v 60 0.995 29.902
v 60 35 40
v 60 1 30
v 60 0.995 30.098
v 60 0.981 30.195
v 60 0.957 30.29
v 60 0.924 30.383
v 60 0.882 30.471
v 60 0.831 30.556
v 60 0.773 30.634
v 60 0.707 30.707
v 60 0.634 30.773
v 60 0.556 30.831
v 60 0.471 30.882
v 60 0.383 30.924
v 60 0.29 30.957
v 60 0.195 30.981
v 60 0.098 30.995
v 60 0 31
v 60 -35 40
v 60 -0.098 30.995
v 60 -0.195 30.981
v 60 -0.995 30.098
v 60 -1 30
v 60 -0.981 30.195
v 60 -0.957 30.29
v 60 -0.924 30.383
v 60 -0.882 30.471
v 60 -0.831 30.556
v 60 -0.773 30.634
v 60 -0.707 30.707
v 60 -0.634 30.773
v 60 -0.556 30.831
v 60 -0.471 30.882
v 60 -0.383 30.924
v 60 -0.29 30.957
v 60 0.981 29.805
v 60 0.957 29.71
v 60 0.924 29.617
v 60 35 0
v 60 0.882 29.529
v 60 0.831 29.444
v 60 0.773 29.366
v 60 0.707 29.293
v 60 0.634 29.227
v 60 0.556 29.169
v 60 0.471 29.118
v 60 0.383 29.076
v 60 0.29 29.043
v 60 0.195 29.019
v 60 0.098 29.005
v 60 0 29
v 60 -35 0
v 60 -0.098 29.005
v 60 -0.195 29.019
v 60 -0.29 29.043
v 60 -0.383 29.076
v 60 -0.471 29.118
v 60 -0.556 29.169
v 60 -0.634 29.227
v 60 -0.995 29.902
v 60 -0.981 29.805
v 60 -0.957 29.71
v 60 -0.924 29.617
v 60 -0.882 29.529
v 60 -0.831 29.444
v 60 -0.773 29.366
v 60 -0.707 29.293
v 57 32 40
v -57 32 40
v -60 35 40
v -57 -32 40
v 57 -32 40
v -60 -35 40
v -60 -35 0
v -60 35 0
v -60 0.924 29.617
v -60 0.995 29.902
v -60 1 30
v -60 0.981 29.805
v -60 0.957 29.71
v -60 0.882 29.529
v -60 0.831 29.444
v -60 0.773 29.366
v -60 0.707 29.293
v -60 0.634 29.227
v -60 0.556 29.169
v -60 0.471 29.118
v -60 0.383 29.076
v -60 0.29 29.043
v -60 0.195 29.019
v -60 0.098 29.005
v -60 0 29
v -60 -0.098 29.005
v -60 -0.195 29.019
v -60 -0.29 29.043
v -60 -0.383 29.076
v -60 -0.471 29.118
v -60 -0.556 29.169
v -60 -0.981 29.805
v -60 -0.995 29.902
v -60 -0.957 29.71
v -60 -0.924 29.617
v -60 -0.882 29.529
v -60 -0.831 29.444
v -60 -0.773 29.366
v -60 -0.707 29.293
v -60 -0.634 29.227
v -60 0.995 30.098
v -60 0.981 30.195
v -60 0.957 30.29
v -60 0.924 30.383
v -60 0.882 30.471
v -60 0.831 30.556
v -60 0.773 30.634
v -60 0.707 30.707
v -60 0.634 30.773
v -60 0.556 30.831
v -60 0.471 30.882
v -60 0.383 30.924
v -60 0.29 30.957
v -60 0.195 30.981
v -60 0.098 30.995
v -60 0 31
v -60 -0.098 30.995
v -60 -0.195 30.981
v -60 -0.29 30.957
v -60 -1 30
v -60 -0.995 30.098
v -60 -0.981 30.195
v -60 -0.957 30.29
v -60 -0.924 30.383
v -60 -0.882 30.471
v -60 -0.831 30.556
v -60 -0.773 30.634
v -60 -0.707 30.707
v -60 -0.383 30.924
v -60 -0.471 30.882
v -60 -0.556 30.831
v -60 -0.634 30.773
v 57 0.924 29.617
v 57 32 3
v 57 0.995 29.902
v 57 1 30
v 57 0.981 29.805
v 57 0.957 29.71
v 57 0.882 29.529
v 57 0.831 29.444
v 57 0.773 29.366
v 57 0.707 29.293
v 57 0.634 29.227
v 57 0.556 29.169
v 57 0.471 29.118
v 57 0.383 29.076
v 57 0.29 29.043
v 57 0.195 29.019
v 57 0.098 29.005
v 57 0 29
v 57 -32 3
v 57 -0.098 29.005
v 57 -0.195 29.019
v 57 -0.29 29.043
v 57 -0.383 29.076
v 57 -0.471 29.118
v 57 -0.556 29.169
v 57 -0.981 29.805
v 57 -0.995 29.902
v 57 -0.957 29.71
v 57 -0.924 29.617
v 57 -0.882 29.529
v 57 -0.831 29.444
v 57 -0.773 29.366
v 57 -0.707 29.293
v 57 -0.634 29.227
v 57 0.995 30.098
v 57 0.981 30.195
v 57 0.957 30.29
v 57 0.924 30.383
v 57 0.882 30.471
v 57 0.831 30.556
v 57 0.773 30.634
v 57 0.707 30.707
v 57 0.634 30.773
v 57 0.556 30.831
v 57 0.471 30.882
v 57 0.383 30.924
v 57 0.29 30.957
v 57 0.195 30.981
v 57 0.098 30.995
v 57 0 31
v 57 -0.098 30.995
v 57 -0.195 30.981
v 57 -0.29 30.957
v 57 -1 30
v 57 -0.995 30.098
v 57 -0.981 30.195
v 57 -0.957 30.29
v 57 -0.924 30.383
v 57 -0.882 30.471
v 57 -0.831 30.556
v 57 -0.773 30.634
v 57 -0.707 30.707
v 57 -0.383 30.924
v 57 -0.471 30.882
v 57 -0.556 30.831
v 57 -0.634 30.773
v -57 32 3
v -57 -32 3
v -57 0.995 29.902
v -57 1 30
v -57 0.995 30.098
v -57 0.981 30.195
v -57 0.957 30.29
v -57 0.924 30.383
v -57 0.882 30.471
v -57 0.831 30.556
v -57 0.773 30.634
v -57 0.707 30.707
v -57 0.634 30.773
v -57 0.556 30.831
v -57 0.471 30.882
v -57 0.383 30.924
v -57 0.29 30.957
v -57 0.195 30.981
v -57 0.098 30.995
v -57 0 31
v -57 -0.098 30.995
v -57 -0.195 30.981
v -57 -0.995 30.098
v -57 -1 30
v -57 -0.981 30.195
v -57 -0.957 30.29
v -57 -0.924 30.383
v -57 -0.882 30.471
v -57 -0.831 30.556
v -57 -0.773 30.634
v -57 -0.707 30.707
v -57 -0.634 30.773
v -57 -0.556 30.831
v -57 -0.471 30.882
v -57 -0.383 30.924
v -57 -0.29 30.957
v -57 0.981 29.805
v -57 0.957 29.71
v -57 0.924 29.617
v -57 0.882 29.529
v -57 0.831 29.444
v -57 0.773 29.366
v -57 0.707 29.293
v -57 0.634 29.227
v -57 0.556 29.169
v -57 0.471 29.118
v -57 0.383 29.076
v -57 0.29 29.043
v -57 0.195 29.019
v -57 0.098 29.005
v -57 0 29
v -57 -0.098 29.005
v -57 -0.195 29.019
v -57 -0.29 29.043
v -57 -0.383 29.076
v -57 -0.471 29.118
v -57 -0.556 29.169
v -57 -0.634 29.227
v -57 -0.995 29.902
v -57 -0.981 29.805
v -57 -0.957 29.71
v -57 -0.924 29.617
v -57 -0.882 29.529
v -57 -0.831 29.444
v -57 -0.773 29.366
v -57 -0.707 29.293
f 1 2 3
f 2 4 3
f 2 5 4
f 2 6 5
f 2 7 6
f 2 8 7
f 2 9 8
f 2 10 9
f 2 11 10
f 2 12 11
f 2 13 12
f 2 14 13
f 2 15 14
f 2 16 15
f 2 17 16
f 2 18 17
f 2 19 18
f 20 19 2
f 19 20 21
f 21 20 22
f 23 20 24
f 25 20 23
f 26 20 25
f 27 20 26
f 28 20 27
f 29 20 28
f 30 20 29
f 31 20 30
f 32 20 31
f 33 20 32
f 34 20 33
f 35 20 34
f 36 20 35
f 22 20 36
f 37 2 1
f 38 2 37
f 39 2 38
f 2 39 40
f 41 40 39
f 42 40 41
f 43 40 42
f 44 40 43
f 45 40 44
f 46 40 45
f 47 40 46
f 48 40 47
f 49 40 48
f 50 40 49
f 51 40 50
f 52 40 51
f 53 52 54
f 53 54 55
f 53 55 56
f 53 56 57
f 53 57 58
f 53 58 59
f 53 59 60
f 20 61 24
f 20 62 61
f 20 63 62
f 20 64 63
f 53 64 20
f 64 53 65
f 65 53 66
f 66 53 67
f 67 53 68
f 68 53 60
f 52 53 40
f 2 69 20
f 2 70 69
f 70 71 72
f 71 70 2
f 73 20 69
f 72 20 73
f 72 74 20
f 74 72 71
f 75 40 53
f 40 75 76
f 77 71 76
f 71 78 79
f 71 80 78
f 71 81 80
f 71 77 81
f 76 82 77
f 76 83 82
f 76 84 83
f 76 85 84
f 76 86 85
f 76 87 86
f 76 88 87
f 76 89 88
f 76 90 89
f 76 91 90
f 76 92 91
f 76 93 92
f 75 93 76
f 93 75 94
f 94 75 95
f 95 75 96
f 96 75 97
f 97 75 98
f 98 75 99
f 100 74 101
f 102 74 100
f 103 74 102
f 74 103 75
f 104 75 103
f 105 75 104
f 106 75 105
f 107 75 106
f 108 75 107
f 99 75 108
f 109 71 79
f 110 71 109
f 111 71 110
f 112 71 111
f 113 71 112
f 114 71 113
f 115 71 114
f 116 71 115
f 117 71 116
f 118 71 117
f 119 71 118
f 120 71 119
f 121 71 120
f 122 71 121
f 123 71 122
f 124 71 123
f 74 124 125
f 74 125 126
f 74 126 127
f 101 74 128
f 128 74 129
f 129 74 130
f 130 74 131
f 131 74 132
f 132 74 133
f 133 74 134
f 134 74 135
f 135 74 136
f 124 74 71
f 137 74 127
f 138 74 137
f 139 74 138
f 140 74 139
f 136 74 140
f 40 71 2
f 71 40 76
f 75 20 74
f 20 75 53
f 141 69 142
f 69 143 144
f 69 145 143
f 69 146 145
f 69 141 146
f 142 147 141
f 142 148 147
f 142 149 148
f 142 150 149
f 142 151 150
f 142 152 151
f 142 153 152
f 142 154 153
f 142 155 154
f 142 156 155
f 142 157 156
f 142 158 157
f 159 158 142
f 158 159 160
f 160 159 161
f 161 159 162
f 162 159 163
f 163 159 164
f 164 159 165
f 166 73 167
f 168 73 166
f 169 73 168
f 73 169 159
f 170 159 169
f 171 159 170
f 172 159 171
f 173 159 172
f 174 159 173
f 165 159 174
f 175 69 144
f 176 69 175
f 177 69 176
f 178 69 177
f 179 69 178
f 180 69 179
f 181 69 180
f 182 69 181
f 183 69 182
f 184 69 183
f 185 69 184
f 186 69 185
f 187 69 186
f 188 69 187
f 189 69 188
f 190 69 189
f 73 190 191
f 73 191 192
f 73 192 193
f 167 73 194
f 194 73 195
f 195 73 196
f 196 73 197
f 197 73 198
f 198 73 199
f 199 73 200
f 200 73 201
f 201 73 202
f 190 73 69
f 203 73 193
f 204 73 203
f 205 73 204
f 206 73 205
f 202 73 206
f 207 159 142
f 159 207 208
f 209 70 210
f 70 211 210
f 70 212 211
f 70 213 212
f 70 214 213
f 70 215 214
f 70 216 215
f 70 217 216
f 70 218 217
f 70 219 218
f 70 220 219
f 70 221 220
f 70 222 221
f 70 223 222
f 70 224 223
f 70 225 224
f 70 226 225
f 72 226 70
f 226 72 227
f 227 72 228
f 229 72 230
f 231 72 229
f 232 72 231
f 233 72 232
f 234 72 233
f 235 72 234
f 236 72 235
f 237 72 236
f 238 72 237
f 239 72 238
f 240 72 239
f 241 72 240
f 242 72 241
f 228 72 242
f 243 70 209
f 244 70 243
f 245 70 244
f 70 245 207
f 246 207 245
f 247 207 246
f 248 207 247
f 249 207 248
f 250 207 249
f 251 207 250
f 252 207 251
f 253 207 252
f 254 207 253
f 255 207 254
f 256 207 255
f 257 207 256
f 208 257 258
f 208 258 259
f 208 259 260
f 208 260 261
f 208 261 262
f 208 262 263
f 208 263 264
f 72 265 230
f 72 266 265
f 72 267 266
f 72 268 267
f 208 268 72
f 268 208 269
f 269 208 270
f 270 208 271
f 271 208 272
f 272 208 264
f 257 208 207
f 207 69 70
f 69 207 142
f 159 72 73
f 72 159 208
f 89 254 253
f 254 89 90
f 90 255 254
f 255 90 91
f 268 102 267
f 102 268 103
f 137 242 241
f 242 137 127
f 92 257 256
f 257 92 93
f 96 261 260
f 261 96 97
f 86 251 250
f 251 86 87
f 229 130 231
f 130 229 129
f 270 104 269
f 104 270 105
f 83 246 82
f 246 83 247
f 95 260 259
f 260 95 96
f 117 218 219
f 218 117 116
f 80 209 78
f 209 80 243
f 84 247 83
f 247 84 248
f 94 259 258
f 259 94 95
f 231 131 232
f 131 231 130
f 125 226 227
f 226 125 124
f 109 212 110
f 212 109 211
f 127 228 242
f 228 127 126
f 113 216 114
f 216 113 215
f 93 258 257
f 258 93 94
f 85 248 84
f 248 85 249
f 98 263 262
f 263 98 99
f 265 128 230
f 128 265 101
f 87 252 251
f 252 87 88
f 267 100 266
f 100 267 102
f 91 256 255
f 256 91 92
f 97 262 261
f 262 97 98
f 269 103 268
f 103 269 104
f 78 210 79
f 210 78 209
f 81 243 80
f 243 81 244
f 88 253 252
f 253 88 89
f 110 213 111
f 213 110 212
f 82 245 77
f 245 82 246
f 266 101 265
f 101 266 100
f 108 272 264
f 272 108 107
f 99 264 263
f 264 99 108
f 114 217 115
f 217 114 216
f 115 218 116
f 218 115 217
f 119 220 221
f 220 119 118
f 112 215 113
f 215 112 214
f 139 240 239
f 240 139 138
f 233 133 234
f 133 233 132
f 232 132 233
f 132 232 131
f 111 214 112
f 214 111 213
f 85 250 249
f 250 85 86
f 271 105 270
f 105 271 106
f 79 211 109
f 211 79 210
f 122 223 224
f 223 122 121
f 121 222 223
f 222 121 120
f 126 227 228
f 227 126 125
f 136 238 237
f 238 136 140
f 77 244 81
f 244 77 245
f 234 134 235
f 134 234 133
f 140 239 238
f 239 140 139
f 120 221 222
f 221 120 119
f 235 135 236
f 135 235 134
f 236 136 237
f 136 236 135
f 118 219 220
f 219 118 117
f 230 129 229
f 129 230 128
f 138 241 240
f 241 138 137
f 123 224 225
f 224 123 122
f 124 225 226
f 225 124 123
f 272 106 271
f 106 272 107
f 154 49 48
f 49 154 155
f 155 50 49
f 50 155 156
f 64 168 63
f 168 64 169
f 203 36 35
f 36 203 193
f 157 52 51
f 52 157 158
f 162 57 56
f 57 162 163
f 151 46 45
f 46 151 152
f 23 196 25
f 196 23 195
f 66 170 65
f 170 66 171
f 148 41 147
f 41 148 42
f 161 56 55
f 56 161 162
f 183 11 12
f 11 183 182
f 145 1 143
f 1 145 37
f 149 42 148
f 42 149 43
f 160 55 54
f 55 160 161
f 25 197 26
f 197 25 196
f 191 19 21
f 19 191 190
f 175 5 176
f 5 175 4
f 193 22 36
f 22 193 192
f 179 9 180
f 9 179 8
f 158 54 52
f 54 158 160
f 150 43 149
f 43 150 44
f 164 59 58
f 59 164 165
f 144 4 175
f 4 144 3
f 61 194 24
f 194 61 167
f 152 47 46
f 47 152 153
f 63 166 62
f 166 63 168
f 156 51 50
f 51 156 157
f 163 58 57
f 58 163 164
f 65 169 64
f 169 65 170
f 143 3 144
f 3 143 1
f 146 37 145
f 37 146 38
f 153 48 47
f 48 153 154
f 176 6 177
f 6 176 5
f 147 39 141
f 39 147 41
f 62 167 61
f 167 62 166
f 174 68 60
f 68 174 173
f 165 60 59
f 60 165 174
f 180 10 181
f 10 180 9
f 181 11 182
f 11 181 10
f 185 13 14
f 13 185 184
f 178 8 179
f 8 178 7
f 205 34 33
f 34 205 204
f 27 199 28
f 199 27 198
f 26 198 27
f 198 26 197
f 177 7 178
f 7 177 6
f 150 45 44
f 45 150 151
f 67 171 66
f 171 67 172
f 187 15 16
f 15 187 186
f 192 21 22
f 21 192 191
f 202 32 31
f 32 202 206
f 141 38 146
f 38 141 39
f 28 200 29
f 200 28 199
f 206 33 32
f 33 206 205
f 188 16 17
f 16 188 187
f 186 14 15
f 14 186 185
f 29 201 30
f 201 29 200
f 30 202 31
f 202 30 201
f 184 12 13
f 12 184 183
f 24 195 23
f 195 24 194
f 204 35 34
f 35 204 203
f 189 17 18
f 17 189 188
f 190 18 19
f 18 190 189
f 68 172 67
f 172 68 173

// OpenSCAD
// Buffer tank for mini horizontal gel-electrophoresis box
// Dimensions measured with calipers

// Outer dimensions
outer_x = 120;
outer_y = 70;
outer_z = 40;

// Wall and floor thickness
wall_thickness = 3;
floor_thickness = 3;

// Inner dimensions (derived)
inner_x = outer_x - 2 * wall_thickness;
inner_y = outer_y - 2 * wall_thickness;
inner_z = outer_z - floor_thickness;

// Gel tray platform dimensions
platform_x = 60;
platform_y = inner_y; // spans full inner width
platform_z = 10; // height above inner floor
platform_top_z = floor_thickness + platform_z; // absolute z position of top surface

// Electrode wire holes
hole_diameter = 2;
hole_y = 0;
hole_z = 30;

// Rendering quality
$fn = 64;

// Main tank body (outer shell minus inner cavity)
difference() {
    // Outer block
    translate([-outer_x/2, -outer_y/2, 0])
        cube([outer_x, outer_y, outer_z]);
    
    // Inner cavity (open top)
    // The cavity starts at floor_thickness and goes up to outer_z + 1 to ensure full cut
    translate([-inner_x/2, -inner_y/2, floor_thickness])
        cube([inner_x, inner_y, outer_z - floor_thickness + 1]);
    
    // Gel tray platform
    // The platform sits on the inner floor (z = floor_thickness) and rises by platform_z
    translate([-platform_x/2, -platform_y/2, floor_thickness])
        cube([platform_x, platform_y, platform_z]);
    
    // Electrode wire holes (left and right end walls)
    // Left end wall hole
    translate([-outer_x/2 + wall_thickness/2, hole_y, hole_z])
        rotate([0, 90, 0])
            cylinder(r = hole_diameter/2, h = wall_thickness + 0.1, center = true);
    
    // Right end wall hole
    translate([outer_x/2 - wall_thickness/2, hole_y, hole_z])
        rotate([0, 90, 0])
            cylinder(r = hole_diameter/2, h = wall_thickness + 0.1, center = true);
}
